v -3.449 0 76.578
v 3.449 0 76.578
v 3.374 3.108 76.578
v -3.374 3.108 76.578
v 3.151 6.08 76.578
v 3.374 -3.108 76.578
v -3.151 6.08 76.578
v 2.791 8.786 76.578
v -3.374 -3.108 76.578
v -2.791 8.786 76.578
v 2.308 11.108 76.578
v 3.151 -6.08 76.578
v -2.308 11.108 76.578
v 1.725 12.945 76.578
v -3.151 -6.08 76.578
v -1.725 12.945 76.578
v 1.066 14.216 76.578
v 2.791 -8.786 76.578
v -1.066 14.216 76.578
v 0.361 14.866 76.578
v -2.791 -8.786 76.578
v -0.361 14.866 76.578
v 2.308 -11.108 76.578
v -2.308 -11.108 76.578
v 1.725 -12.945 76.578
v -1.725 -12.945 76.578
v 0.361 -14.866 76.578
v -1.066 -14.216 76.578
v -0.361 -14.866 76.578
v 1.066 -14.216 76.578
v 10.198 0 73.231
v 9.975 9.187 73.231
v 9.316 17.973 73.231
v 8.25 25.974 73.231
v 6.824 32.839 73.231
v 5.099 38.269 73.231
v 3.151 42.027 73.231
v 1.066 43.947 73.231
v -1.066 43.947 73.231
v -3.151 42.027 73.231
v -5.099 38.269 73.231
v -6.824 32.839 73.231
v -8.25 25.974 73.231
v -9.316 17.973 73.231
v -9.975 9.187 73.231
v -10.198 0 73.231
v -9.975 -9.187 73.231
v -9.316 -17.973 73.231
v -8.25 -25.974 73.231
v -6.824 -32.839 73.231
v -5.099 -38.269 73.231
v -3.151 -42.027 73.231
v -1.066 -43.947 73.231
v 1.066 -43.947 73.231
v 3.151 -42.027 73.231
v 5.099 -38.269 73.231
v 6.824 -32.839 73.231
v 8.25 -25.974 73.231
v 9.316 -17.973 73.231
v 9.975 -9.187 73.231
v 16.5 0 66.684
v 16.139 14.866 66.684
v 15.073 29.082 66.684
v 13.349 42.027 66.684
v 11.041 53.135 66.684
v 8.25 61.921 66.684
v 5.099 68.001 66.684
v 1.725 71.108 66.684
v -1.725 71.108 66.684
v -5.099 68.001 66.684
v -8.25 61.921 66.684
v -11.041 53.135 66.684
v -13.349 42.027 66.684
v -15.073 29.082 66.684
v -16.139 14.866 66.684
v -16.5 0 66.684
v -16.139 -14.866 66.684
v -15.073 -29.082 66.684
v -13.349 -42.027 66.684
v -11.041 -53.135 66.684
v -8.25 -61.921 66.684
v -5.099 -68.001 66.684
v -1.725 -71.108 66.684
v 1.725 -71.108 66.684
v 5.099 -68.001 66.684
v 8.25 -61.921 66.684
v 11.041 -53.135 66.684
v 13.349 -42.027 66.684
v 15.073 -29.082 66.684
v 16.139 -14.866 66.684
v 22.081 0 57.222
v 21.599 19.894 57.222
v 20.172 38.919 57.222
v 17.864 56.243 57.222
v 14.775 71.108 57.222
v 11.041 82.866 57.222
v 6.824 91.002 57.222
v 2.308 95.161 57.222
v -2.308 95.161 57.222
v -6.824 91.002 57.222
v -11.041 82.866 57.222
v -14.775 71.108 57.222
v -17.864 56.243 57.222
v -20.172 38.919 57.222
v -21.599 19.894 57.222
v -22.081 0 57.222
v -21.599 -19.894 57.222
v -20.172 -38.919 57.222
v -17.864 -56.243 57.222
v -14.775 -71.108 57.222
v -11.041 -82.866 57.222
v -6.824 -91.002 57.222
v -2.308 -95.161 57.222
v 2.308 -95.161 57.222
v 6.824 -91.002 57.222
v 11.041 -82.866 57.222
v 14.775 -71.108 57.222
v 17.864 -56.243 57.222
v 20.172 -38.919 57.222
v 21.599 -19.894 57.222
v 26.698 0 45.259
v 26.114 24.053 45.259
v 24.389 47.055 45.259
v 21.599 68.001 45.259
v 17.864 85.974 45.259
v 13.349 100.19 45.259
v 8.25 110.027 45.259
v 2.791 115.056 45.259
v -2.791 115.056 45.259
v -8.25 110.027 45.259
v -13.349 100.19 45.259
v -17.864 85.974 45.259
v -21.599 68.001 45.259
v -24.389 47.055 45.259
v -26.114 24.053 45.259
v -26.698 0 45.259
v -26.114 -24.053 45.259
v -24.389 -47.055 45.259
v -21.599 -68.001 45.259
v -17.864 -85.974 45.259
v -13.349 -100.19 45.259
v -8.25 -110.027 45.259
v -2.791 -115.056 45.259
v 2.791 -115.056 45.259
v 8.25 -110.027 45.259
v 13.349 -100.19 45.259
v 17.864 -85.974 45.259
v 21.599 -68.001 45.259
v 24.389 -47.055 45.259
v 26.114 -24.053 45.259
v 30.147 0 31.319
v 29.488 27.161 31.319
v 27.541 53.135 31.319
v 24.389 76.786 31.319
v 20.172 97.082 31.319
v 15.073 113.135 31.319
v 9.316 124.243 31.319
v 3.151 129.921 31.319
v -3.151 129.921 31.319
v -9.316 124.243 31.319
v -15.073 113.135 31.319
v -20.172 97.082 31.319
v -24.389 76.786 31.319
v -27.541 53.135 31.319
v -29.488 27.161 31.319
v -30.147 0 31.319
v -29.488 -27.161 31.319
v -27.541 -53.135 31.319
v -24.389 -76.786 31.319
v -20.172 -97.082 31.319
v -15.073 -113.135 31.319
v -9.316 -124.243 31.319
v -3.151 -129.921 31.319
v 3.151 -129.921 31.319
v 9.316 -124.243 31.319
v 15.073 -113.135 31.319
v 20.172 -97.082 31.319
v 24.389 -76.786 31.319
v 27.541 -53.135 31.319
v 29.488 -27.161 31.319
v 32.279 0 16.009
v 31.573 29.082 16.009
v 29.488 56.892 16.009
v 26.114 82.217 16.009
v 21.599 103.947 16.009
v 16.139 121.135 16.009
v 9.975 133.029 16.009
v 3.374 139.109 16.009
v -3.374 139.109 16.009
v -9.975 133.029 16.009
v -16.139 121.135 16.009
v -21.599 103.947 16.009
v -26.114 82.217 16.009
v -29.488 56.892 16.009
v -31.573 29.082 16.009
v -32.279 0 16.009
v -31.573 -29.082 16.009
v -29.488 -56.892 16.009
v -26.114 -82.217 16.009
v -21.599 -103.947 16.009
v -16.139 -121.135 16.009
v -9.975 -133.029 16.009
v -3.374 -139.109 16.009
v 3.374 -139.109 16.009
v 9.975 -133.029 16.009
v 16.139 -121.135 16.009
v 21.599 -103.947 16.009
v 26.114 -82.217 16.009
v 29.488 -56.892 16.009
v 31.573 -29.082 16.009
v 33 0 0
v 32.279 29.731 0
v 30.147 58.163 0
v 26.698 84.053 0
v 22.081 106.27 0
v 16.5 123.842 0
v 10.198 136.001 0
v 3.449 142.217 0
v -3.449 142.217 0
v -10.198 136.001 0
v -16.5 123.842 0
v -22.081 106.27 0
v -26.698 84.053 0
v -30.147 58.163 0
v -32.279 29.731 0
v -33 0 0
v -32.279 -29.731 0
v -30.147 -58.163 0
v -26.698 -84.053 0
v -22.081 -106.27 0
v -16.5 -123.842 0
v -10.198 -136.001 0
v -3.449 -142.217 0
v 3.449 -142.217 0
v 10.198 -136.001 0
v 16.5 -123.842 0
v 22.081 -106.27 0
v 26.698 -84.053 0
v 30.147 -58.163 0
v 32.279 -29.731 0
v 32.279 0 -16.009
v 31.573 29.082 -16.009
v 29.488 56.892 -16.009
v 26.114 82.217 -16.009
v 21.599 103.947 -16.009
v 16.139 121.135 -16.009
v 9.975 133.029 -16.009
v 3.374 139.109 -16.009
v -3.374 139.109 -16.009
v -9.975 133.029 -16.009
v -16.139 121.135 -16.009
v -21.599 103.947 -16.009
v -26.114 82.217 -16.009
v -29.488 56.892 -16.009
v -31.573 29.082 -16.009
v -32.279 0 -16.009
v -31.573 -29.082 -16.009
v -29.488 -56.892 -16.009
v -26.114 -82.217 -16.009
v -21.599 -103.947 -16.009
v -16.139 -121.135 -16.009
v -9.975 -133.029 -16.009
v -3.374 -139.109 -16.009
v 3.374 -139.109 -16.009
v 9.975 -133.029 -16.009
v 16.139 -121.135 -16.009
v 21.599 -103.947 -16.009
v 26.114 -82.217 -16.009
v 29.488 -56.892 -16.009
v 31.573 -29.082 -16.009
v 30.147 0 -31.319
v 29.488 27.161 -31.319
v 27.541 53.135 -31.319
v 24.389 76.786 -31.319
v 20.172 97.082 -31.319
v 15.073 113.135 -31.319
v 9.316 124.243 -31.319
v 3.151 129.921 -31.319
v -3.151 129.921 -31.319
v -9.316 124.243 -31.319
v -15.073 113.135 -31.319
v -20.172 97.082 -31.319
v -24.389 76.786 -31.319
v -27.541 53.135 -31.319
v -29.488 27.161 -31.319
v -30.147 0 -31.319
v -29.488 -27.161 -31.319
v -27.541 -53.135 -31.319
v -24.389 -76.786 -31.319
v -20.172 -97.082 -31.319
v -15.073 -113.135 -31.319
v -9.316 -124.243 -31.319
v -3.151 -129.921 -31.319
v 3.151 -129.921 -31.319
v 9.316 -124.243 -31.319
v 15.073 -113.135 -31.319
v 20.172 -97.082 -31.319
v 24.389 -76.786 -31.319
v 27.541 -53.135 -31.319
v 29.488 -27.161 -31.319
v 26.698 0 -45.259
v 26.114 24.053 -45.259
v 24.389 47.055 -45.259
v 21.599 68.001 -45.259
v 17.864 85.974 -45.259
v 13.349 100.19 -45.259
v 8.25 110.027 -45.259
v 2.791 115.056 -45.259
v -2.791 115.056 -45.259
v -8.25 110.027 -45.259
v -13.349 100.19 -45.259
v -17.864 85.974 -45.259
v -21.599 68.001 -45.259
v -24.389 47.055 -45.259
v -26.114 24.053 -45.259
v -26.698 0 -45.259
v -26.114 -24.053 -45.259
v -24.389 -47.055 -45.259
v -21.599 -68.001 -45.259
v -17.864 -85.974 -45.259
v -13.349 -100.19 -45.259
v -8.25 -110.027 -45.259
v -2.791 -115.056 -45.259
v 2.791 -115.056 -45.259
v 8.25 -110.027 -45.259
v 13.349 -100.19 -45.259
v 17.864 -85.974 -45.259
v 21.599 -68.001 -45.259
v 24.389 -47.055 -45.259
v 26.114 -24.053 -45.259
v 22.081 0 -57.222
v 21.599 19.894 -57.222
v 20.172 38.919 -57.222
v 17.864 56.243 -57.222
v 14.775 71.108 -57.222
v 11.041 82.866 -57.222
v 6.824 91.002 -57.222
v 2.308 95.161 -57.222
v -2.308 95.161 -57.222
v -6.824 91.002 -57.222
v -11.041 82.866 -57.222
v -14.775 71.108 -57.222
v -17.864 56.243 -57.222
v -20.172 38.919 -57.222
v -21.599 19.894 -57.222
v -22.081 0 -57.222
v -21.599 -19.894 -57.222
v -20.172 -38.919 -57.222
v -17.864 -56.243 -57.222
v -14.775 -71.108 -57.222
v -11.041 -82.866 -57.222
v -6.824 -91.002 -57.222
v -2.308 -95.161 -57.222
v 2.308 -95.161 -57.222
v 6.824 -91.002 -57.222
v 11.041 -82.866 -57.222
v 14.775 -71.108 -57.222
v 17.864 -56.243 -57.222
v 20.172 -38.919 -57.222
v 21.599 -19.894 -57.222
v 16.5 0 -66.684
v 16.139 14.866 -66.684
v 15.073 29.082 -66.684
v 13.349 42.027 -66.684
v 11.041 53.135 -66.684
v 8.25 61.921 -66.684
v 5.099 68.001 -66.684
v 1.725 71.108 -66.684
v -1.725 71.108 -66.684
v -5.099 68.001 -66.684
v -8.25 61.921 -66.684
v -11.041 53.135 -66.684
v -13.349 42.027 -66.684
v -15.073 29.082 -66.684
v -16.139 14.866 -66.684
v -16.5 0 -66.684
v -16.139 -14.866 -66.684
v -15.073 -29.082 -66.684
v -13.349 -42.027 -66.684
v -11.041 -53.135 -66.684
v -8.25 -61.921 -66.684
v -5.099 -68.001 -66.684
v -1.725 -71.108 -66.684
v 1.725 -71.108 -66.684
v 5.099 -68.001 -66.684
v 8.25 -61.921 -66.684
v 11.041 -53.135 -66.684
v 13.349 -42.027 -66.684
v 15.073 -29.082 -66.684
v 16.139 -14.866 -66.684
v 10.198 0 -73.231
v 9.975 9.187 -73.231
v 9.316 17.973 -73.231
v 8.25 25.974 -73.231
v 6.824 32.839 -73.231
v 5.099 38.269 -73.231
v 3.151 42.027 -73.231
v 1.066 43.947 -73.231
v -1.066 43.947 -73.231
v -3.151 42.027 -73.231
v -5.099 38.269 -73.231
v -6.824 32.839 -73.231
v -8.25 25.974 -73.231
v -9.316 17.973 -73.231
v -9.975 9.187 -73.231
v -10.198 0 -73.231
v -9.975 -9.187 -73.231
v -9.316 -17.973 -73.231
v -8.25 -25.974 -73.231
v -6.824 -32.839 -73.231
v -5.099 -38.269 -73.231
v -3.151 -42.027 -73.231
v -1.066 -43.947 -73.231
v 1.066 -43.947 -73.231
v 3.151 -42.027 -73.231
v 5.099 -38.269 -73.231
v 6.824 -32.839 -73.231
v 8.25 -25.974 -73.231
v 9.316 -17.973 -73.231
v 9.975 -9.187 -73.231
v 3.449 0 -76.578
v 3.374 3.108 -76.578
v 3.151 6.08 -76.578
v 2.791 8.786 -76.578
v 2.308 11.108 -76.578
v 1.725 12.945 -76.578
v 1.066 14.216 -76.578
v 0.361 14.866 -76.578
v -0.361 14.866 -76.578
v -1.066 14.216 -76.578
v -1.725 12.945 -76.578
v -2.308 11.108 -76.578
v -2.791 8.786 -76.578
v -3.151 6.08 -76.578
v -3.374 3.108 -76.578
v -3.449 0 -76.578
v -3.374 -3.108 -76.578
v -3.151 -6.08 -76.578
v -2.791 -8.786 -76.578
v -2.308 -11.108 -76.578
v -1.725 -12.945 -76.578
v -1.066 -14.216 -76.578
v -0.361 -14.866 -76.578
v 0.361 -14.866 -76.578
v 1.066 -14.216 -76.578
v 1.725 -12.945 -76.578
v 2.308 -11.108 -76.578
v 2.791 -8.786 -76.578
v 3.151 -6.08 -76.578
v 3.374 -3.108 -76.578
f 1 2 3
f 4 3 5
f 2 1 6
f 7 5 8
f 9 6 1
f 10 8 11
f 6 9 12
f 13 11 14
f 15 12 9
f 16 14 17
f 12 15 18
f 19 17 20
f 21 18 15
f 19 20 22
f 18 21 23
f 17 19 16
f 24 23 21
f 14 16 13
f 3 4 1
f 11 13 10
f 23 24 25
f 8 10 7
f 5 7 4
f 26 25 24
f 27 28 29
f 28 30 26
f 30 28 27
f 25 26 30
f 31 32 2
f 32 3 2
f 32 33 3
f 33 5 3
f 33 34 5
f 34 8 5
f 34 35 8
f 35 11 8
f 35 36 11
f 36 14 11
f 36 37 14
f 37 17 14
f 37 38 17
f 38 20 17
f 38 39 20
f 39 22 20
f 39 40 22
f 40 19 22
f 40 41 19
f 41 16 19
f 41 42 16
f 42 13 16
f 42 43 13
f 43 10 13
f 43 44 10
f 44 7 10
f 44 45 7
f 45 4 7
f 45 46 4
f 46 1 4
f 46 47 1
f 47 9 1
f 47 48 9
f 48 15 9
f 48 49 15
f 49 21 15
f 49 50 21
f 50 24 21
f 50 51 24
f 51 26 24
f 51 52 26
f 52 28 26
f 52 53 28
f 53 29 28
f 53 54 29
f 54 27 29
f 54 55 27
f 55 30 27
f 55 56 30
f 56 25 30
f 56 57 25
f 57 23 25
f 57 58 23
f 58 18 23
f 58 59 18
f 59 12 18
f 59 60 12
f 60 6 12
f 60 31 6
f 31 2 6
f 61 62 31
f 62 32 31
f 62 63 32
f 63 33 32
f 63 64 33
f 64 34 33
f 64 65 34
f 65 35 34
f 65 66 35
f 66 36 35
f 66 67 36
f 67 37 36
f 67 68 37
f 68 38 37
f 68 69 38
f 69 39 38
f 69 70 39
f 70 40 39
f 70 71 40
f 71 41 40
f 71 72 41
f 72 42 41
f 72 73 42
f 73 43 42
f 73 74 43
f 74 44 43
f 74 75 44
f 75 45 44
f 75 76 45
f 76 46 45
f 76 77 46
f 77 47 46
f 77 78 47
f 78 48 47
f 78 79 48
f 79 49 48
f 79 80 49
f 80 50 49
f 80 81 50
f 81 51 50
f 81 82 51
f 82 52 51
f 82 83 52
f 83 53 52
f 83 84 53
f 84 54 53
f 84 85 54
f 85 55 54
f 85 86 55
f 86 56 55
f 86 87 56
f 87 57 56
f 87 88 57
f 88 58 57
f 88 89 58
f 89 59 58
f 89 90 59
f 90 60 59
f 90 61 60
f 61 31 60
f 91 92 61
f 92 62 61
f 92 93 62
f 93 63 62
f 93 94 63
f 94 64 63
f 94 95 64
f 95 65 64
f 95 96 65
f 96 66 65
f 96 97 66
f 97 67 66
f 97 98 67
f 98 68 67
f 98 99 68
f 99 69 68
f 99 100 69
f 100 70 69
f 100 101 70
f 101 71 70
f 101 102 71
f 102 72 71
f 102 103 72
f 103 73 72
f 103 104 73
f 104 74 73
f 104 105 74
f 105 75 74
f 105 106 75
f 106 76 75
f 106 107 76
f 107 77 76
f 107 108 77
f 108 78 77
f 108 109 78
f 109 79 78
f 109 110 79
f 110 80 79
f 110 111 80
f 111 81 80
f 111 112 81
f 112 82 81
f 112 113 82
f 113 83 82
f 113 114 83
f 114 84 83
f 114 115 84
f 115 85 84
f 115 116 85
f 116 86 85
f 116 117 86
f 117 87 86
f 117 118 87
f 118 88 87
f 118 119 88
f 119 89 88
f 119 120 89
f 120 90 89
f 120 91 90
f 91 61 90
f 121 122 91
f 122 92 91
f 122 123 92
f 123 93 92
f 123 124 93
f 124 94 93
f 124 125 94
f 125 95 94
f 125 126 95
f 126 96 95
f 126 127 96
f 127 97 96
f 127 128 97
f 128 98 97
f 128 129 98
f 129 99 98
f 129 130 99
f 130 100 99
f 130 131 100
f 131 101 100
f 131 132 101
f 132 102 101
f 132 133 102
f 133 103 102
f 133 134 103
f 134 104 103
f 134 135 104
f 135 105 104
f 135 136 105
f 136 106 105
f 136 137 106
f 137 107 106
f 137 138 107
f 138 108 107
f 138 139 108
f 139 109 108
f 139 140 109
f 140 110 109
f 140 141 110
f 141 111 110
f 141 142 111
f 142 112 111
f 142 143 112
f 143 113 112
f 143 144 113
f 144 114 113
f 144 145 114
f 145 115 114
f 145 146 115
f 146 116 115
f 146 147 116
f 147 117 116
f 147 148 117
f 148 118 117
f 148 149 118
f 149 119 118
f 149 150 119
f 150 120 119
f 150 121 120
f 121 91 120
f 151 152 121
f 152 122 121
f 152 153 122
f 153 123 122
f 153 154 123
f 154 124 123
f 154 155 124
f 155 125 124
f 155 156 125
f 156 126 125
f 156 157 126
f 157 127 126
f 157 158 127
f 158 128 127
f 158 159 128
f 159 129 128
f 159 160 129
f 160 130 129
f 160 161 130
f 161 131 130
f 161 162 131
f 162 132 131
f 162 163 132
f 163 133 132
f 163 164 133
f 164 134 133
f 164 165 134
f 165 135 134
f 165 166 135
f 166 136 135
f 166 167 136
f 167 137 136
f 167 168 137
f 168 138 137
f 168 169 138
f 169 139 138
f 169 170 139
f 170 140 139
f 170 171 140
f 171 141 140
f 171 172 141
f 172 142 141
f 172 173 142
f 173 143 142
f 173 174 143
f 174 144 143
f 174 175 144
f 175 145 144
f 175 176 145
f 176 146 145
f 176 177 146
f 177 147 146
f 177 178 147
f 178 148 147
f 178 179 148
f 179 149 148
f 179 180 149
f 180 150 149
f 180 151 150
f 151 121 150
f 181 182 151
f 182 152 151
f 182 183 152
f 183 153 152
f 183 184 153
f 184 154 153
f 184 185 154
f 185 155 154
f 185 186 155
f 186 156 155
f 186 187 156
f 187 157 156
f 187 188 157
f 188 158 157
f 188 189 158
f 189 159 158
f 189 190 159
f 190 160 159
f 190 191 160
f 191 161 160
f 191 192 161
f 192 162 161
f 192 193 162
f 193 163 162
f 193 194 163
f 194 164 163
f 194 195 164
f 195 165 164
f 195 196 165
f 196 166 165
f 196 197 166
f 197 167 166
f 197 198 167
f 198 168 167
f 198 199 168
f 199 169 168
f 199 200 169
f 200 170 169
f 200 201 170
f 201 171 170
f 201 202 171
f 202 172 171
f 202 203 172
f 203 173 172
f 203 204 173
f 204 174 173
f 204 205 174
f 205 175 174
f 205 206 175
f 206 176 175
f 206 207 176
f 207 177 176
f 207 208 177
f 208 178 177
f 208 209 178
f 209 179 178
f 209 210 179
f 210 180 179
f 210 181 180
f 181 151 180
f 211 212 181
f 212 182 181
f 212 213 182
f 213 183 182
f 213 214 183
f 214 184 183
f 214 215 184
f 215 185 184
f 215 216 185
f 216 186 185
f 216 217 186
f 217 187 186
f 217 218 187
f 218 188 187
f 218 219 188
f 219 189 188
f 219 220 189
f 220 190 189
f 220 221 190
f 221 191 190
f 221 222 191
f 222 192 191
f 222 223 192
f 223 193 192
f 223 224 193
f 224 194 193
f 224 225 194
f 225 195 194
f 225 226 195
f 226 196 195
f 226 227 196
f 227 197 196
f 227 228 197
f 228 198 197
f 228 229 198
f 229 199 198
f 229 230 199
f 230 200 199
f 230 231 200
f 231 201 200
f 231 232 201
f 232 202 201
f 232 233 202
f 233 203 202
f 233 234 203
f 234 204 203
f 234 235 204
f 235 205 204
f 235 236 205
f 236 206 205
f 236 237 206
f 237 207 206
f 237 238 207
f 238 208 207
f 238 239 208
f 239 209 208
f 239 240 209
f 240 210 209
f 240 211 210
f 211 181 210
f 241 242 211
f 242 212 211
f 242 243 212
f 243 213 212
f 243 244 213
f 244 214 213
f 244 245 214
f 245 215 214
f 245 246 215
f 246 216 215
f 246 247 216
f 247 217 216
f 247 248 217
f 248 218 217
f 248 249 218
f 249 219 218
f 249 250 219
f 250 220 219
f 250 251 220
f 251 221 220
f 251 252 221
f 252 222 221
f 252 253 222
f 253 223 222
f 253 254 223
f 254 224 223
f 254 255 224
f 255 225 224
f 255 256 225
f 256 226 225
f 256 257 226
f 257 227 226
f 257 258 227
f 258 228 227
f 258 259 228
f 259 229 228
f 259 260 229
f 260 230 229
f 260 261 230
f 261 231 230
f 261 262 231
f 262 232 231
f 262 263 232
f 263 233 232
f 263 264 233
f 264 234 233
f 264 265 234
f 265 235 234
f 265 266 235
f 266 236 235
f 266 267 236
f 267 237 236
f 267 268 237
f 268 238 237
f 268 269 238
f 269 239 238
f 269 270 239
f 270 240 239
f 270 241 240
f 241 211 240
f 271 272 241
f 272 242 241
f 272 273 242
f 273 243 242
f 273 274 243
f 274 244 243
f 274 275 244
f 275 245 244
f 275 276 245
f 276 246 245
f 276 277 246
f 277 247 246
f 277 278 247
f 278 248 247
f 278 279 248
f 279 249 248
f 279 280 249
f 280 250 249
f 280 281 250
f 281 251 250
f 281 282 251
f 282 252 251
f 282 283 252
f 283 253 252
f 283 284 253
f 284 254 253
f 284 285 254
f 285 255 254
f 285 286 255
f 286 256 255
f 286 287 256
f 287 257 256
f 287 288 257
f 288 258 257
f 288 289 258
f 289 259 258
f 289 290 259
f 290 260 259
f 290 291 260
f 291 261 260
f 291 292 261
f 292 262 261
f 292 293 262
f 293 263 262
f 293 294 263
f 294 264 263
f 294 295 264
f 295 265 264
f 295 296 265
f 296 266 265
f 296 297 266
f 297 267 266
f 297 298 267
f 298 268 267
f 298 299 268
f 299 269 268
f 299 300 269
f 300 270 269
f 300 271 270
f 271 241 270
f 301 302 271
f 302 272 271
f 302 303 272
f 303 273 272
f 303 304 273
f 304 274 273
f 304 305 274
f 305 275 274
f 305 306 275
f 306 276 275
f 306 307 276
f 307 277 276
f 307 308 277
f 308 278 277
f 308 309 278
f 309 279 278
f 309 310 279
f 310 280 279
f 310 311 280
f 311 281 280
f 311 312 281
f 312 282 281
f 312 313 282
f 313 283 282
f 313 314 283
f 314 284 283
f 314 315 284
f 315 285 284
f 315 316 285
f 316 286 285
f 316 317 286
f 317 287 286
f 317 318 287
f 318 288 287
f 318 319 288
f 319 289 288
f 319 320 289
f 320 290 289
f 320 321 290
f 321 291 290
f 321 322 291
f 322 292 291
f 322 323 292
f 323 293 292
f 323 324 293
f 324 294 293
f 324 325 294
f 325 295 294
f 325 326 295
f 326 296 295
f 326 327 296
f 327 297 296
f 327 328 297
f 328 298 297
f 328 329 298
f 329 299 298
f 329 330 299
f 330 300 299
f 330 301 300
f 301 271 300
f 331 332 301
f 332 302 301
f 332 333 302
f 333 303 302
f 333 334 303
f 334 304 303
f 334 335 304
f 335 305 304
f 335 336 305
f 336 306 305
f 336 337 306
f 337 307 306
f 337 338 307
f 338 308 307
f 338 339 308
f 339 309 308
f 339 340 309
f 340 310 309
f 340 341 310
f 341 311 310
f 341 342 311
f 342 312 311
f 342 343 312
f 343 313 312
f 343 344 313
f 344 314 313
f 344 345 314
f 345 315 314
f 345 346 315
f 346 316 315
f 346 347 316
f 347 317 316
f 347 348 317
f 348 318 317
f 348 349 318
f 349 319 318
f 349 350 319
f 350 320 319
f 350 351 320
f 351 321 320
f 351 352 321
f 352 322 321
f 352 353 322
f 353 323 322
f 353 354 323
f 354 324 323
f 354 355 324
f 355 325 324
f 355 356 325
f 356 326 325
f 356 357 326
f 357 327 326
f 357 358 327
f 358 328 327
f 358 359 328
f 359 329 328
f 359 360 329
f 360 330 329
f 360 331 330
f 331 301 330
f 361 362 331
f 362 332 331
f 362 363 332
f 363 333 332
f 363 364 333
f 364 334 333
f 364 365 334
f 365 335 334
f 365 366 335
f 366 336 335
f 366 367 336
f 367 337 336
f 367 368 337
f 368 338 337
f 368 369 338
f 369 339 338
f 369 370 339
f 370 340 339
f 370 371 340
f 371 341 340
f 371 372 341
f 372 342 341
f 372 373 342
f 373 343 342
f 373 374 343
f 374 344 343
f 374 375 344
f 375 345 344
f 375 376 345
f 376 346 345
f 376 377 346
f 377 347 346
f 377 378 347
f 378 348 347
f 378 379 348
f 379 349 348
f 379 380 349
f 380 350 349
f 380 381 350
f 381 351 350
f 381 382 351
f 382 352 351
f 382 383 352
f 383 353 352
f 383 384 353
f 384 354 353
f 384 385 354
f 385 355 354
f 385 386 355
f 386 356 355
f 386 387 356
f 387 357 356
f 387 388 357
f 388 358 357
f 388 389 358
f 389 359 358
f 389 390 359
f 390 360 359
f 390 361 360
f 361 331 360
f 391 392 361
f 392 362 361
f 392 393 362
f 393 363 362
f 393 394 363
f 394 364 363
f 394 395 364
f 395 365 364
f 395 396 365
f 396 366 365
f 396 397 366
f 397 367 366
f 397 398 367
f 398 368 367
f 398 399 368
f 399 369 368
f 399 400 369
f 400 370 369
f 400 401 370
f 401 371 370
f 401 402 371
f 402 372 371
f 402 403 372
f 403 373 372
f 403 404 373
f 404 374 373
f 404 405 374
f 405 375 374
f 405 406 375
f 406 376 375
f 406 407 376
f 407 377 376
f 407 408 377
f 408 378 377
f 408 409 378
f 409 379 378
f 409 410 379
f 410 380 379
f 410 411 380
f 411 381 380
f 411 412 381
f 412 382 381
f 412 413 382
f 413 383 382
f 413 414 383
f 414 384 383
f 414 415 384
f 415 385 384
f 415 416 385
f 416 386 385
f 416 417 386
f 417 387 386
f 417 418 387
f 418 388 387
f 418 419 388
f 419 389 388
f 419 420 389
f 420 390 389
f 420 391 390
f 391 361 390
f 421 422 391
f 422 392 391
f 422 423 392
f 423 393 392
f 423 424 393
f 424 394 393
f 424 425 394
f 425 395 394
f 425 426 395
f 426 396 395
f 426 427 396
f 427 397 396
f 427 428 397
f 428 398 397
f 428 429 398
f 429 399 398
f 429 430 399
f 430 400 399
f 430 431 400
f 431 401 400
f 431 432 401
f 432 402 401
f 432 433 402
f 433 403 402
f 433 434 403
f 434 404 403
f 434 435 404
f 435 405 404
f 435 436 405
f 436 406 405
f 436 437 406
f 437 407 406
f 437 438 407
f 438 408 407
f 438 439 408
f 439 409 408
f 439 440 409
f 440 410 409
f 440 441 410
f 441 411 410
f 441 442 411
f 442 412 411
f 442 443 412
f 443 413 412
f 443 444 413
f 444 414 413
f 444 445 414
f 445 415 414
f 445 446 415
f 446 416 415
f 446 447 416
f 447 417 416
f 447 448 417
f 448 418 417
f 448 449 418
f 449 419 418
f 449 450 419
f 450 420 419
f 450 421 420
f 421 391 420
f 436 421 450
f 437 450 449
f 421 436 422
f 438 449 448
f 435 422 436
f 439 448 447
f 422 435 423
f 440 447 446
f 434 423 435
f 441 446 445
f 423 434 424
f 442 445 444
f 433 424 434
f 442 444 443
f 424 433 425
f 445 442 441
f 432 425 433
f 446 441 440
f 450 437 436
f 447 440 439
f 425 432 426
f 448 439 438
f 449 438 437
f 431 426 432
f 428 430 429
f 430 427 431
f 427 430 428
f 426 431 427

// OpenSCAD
// Generated by SolidPython 1.0.1 on 2020-07-29 00:46:45


scale(v = [3, 13, 7]) {
	sphere(r = 11);
}
/***********************************************
*********      SolidPython code:      **********
************************************************
 
# import packages: SolidPython
from solid import *
from solid.utils import *
from itertools import chain, combinations, permutations


class Resize:

    def __init__(self, scad_file):
        self.scad_file = scad_file
        #self.scad_file = import_scad(scad_file)
        # cone/cylinder param:
        self.r1 = 0
        self.r2 = 0
        self.h = 0
        # rectangular prism param:
        self.w = 0
        self.l = 0
        # ellipse param:
        self.r = 0

    # import OpenScad code (file name corresponds to shape)


    # classify shape + parameters
    def assign(self, param1, param2, param3):
        if self.scad_file == 'cone.scad':
            self.r1 = param1
            self.r2 = param2
            self.h = param3
        elif self.scad_file == 'cylinder.scad':
            self.r1 = param1
            self.r2 = param2
            self.h = param3
        elif self.scad_file == 'rectangularPrism.scad':
            self.h = param1
            self.l = param2
            self.w = param3
        else:
            self.r = param1
            self.h = param2

    # resize parameters
    def iterate(self):
        x = range(3, 20, 2)
        i = 1
        if self.scad_file == 'cone.scad':
            tempList = list(permutations(x, 2))
            for temp in tempList:
                param1 = temp[0]
                param2 = temp[1]
                filepath = 'produced_scad_files/' + 'cone' + str(param1) + '_' + str(param2) + '_' + '.scad'
                scad_render_to_file(cylinder(h=param1, r1=param2, r2=0), filepath)

        elif self.scad_file == 'cylinder.scad':
            tempList = list(permutations(x, 3))
            for temp in tempList:
                param1 = temp[0]
                param2 = temp[1]
                filepath = 'produced_scad_files/' + 'cylinder' + str(param1) + '_' + str(param2) + '_' + '.scad'
                scad_render_to_file(cylinder(h=param1, r1=param2, r2=param2), filepath)

        elif self.scad_file == 'rectangularPrism.scad':
            tempList = list(permutations(x, 3))
            for temp in tempList:
                param1 = temp[0]
                param2 = temp[1]
                param3 = temp[2]
                filepath = 'produced_scad_files/' + 'rectangularPrism' + str(param1) + '_' + str(param2) + '_' + str(
                    param3) + '.scad'
                scad_render_to_file(cube(size=(param1, param2, param3)), filepath)

        elif self.scad_file == 'ellipse.scad':
            tempList = list(permutations(x, 4))
            for temp in tempList:
                param1 = temp[0]
                param2 = temp[1]
                param3 = temp[2]
                param4 = temp[3]
                filepath = 'produced_scad_files/' + 'ellipse' + str(param1) + '_' + str(param2) + '_' + str(param3) + '_' + str(param4) + '.scad'
                scad_render_to_file(scale([param1, param2, param3])(sphere(r=param4)), filepath)

    def render_to_scadfile(self):
        scad_render_to_file(scad, 'example.scad') 
 
************************************************/
